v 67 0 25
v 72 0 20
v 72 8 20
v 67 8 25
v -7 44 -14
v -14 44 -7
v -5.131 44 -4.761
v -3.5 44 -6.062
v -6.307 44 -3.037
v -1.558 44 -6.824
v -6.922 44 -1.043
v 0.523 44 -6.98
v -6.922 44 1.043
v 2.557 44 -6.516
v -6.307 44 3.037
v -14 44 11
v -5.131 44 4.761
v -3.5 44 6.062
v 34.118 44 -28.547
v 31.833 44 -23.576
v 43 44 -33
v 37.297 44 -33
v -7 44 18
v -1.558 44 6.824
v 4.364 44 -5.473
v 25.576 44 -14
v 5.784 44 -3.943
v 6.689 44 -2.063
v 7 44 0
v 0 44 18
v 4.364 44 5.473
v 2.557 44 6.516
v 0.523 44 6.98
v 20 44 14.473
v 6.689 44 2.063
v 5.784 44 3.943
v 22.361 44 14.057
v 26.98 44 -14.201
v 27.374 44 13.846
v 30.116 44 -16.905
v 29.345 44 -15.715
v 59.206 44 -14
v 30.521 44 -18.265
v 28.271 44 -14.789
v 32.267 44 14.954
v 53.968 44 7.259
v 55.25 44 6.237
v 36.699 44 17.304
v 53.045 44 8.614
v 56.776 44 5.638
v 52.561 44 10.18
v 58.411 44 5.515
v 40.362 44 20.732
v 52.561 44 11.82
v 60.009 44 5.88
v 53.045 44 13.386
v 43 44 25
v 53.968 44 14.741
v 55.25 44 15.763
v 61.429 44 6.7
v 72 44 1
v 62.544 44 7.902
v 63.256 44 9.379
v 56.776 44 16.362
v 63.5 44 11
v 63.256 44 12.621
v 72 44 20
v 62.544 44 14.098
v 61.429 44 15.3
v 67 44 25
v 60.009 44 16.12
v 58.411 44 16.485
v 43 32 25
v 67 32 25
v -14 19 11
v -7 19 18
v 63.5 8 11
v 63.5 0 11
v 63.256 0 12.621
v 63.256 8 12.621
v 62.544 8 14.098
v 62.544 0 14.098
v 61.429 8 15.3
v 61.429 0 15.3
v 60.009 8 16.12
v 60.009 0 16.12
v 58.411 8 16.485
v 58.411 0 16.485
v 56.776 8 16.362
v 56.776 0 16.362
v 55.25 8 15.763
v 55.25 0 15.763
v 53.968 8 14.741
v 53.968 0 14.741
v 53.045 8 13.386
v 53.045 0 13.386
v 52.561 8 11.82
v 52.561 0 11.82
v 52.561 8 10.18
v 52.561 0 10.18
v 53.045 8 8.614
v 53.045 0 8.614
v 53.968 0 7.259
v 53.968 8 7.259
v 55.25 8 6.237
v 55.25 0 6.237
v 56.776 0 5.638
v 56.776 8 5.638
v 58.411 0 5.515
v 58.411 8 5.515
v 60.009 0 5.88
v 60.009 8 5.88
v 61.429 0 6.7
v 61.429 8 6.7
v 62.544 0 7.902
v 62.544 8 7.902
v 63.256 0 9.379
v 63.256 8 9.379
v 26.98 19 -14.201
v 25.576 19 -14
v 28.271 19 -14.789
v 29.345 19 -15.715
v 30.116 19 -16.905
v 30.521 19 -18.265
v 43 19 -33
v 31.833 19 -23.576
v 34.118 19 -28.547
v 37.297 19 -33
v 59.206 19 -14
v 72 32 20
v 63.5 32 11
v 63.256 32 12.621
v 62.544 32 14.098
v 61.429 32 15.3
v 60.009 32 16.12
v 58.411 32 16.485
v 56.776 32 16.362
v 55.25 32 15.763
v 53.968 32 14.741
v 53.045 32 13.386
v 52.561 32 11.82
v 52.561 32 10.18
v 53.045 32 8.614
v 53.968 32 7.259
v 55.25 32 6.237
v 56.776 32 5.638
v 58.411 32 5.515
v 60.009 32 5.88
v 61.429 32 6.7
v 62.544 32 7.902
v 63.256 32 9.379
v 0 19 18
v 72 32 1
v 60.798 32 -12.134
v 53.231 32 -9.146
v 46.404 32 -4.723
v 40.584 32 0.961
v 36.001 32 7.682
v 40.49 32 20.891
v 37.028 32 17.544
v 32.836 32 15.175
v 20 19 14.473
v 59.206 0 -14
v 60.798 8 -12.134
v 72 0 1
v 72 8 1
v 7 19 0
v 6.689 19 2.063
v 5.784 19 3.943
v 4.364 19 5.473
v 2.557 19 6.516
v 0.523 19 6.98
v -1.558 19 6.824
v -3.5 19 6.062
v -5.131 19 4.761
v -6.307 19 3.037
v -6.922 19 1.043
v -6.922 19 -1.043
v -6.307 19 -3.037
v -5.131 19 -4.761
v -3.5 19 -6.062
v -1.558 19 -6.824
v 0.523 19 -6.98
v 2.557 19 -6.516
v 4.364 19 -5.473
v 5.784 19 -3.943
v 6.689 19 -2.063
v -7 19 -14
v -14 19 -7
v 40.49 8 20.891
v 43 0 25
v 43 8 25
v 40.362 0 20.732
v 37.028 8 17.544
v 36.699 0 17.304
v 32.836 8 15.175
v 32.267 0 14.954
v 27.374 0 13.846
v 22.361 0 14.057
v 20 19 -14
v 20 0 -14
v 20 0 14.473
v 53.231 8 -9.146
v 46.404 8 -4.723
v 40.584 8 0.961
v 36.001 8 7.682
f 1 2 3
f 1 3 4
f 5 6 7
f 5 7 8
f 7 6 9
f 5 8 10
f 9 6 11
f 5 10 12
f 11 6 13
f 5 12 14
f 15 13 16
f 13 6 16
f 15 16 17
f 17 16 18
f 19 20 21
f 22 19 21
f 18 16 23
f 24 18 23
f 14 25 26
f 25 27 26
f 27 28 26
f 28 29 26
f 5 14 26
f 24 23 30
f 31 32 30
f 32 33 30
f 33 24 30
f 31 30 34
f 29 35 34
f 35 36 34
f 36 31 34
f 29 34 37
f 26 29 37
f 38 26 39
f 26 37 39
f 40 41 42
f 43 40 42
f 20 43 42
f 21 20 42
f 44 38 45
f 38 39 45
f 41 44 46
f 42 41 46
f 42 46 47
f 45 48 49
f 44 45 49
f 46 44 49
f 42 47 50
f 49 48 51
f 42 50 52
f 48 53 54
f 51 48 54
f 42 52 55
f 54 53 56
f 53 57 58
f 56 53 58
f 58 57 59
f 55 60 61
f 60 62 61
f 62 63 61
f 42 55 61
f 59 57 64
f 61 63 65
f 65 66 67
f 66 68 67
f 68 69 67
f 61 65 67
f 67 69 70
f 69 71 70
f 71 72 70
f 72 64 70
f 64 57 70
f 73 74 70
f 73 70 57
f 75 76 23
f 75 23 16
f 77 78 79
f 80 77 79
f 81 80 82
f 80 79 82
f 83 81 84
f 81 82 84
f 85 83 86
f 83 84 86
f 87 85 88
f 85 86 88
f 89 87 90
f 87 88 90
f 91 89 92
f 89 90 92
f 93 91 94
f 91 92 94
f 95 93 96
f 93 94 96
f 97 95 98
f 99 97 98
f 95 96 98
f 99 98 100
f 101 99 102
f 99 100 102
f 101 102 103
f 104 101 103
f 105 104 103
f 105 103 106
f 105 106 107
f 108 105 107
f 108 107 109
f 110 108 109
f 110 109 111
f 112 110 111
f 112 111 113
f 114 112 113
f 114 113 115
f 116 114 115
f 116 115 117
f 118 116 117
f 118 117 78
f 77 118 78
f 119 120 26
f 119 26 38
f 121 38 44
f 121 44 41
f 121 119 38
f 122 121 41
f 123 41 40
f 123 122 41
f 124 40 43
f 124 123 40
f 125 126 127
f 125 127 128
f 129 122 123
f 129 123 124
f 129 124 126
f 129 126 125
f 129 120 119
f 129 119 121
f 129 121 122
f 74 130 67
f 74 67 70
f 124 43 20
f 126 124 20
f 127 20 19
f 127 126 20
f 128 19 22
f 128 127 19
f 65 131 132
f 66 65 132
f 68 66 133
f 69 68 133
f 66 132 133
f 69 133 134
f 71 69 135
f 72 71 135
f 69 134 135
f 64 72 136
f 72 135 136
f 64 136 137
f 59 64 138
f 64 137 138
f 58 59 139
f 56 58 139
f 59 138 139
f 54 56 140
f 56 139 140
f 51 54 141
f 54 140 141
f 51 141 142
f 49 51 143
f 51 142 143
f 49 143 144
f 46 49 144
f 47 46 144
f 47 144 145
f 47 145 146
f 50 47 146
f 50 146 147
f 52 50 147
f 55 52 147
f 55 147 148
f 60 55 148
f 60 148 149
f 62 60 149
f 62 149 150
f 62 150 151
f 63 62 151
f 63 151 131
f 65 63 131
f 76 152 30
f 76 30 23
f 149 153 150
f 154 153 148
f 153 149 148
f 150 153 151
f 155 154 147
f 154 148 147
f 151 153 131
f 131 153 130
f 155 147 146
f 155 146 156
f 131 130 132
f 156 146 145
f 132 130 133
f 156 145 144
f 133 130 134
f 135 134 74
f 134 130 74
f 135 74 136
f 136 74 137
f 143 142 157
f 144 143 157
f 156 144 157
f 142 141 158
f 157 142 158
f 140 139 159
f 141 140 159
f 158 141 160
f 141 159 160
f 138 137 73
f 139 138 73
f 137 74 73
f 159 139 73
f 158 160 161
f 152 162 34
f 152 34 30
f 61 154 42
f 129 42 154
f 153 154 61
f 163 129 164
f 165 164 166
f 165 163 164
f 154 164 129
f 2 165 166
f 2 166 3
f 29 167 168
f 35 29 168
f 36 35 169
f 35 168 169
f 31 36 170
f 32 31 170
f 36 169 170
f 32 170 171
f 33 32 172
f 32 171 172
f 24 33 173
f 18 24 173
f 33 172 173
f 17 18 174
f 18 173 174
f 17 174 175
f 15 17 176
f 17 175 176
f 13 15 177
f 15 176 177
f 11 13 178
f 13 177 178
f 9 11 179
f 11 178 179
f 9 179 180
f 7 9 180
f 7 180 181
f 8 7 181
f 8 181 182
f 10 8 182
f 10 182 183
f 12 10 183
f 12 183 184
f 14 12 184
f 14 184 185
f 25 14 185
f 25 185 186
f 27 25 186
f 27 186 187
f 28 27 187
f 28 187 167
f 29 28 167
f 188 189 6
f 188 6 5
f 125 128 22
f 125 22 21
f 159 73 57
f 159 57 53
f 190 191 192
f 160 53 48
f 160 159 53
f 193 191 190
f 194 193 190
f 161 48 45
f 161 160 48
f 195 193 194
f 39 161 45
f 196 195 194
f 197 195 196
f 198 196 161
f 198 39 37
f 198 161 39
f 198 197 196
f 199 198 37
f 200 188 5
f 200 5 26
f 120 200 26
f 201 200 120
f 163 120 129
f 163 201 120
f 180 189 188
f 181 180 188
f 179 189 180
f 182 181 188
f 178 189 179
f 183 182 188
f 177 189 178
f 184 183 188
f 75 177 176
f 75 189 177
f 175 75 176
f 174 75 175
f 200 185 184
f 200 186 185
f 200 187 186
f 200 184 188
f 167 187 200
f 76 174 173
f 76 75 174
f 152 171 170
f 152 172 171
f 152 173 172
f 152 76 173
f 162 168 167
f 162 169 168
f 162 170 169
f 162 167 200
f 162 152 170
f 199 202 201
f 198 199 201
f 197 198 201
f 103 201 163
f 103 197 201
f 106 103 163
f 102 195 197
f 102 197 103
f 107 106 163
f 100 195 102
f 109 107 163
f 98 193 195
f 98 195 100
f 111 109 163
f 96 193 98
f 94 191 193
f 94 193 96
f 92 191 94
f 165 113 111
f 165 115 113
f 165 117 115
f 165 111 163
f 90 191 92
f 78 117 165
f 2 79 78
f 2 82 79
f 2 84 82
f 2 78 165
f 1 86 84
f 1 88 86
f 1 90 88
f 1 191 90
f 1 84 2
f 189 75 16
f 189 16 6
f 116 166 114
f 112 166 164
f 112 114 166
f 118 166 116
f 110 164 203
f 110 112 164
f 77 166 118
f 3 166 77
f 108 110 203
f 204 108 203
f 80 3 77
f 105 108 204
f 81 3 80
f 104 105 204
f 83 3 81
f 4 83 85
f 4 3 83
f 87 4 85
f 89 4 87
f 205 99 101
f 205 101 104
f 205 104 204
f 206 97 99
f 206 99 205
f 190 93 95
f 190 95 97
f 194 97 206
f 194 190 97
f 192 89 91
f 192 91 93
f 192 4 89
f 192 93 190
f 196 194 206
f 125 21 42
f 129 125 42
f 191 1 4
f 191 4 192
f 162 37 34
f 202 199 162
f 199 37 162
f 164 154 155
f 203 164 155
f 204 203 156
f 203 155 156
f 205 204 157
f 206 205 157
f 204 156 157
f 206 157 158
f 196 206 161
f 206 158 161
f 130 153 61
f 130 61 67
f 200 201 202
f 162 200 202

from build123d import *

# Parameters (mm, degrees)
F0_R     = 7
F0_R_2   = 5.5
F1_DEPTH = 44
F2_DEPTH = 19
F5_DEPTH = 24
F6_DEPTH = 19


with BuildPart() as f1:
    # F0 (on Front) → F1 (new body)
    with BuildSketch(Plane.XZ):
        Polygon((-14, 11), (-14, -7), (-7, -14), (20, -14), (20, 14.4734603858), (0, 18), (-7, 18), align=None)
        Circle(F0_R, mode=Mode.SUBTRACT)
        with BuildLine():
            Line((20, 14.4734603858), (20, -14))
            Line((20, -14), (25.5755389113, -14))
            Line((25.5755389113, -14), (59.2058823529, -14))
            Line((59.2058823529, -14), (72, 1))
            Line((72, 1), (72, 20))
            Line((72, 20), (67, 25))
            Line((67, 25), (43, 25))
            ThreePointArc((43, 25), (34.5610987057, 15.9820441422), (22.3613808358, 14.0570852328))
            Line((22.3613808358, 14.0570852328), (20, 14.4734603858))
        make_face()
        with Locations((58, 11)):
            Circle(F0_R_2, mode=Mode.SUBTRACT)
        with BuildLine():
            Line((59.2058823529, -14), (25.5755389113, -14))
            ThreePointArc((25.5755389113, -14), (28.8407746924, -15.2134137678), (30.5211776528, -18.2647058824))
            ThreePointArc((30.5211776528, -18.2647058824), (32.8580078559, -26.115672061), (37.2969800527, -33))
            Line((37.2969800527, -33), (43, -33))
            Line((43, -33), (59.2058823529, -14))
        make_face()
    extrude(amount=-F1_DEPTH)

    # F0 (on Front) → F2 (cut)
    with BuildSketch(Plane.XZ):
        Polygon((-14, 11), (-14, -7), (-7, -14), (20, -14), (20, 14.4734603858), (0, 18), (-7, 18), align=None)
        Circle(F0_R, mode=Mode.SUBTRACT)
    extrude(amount=-F2_DEPTH, mode=Mode.SUBTRACT)

    # F4 (on offset) → F5 (cut)
    with BuildSketch(Plane(origin=(0, 32, 0), x_dir=(-1, 0, 0), z_dir=(0, 1, 0))):
        with BuildLine():
            Line((-79.095418143, 42.8479425609), (-79.095418143, -13.075442161))
            ThreePointArc((-79.095418143, -13.075442161), (-39.789926782, 1.9384056037), (-34.4063231516, 43.6679405614))
            Line((-34.4063231516, 43.6679405614), (-79.095418143, 42.8479425609))
        make_face()
    extrude(amount=-F5_DEPTH, mode=Mode.SUBTRACT)

    # F0 (on Front) → F6 (cut)
    with BuildSketch(Plane.XZ):
        with BuildLine():
            Line((59.2058823529, -14), (25.5755389113, -14))
            ThreePointArc((25.5755389113, -14), (28.8407746924, -15.2134137678), (30.5211776528, -18.2647058824))
            ThreePointArc((30.5211776528, -18.2647058824), (32.8580078559, -26.115672061), (37.2969800527, -33))
            Line((37.2969800527, -33), (43, -33))
            Line((43, -33), (59.2058823529, -14))
        make_face()
    extrude(amount=-F6_DEPTH, mode=Mode.SUBTRACT)


solid = f1.part
